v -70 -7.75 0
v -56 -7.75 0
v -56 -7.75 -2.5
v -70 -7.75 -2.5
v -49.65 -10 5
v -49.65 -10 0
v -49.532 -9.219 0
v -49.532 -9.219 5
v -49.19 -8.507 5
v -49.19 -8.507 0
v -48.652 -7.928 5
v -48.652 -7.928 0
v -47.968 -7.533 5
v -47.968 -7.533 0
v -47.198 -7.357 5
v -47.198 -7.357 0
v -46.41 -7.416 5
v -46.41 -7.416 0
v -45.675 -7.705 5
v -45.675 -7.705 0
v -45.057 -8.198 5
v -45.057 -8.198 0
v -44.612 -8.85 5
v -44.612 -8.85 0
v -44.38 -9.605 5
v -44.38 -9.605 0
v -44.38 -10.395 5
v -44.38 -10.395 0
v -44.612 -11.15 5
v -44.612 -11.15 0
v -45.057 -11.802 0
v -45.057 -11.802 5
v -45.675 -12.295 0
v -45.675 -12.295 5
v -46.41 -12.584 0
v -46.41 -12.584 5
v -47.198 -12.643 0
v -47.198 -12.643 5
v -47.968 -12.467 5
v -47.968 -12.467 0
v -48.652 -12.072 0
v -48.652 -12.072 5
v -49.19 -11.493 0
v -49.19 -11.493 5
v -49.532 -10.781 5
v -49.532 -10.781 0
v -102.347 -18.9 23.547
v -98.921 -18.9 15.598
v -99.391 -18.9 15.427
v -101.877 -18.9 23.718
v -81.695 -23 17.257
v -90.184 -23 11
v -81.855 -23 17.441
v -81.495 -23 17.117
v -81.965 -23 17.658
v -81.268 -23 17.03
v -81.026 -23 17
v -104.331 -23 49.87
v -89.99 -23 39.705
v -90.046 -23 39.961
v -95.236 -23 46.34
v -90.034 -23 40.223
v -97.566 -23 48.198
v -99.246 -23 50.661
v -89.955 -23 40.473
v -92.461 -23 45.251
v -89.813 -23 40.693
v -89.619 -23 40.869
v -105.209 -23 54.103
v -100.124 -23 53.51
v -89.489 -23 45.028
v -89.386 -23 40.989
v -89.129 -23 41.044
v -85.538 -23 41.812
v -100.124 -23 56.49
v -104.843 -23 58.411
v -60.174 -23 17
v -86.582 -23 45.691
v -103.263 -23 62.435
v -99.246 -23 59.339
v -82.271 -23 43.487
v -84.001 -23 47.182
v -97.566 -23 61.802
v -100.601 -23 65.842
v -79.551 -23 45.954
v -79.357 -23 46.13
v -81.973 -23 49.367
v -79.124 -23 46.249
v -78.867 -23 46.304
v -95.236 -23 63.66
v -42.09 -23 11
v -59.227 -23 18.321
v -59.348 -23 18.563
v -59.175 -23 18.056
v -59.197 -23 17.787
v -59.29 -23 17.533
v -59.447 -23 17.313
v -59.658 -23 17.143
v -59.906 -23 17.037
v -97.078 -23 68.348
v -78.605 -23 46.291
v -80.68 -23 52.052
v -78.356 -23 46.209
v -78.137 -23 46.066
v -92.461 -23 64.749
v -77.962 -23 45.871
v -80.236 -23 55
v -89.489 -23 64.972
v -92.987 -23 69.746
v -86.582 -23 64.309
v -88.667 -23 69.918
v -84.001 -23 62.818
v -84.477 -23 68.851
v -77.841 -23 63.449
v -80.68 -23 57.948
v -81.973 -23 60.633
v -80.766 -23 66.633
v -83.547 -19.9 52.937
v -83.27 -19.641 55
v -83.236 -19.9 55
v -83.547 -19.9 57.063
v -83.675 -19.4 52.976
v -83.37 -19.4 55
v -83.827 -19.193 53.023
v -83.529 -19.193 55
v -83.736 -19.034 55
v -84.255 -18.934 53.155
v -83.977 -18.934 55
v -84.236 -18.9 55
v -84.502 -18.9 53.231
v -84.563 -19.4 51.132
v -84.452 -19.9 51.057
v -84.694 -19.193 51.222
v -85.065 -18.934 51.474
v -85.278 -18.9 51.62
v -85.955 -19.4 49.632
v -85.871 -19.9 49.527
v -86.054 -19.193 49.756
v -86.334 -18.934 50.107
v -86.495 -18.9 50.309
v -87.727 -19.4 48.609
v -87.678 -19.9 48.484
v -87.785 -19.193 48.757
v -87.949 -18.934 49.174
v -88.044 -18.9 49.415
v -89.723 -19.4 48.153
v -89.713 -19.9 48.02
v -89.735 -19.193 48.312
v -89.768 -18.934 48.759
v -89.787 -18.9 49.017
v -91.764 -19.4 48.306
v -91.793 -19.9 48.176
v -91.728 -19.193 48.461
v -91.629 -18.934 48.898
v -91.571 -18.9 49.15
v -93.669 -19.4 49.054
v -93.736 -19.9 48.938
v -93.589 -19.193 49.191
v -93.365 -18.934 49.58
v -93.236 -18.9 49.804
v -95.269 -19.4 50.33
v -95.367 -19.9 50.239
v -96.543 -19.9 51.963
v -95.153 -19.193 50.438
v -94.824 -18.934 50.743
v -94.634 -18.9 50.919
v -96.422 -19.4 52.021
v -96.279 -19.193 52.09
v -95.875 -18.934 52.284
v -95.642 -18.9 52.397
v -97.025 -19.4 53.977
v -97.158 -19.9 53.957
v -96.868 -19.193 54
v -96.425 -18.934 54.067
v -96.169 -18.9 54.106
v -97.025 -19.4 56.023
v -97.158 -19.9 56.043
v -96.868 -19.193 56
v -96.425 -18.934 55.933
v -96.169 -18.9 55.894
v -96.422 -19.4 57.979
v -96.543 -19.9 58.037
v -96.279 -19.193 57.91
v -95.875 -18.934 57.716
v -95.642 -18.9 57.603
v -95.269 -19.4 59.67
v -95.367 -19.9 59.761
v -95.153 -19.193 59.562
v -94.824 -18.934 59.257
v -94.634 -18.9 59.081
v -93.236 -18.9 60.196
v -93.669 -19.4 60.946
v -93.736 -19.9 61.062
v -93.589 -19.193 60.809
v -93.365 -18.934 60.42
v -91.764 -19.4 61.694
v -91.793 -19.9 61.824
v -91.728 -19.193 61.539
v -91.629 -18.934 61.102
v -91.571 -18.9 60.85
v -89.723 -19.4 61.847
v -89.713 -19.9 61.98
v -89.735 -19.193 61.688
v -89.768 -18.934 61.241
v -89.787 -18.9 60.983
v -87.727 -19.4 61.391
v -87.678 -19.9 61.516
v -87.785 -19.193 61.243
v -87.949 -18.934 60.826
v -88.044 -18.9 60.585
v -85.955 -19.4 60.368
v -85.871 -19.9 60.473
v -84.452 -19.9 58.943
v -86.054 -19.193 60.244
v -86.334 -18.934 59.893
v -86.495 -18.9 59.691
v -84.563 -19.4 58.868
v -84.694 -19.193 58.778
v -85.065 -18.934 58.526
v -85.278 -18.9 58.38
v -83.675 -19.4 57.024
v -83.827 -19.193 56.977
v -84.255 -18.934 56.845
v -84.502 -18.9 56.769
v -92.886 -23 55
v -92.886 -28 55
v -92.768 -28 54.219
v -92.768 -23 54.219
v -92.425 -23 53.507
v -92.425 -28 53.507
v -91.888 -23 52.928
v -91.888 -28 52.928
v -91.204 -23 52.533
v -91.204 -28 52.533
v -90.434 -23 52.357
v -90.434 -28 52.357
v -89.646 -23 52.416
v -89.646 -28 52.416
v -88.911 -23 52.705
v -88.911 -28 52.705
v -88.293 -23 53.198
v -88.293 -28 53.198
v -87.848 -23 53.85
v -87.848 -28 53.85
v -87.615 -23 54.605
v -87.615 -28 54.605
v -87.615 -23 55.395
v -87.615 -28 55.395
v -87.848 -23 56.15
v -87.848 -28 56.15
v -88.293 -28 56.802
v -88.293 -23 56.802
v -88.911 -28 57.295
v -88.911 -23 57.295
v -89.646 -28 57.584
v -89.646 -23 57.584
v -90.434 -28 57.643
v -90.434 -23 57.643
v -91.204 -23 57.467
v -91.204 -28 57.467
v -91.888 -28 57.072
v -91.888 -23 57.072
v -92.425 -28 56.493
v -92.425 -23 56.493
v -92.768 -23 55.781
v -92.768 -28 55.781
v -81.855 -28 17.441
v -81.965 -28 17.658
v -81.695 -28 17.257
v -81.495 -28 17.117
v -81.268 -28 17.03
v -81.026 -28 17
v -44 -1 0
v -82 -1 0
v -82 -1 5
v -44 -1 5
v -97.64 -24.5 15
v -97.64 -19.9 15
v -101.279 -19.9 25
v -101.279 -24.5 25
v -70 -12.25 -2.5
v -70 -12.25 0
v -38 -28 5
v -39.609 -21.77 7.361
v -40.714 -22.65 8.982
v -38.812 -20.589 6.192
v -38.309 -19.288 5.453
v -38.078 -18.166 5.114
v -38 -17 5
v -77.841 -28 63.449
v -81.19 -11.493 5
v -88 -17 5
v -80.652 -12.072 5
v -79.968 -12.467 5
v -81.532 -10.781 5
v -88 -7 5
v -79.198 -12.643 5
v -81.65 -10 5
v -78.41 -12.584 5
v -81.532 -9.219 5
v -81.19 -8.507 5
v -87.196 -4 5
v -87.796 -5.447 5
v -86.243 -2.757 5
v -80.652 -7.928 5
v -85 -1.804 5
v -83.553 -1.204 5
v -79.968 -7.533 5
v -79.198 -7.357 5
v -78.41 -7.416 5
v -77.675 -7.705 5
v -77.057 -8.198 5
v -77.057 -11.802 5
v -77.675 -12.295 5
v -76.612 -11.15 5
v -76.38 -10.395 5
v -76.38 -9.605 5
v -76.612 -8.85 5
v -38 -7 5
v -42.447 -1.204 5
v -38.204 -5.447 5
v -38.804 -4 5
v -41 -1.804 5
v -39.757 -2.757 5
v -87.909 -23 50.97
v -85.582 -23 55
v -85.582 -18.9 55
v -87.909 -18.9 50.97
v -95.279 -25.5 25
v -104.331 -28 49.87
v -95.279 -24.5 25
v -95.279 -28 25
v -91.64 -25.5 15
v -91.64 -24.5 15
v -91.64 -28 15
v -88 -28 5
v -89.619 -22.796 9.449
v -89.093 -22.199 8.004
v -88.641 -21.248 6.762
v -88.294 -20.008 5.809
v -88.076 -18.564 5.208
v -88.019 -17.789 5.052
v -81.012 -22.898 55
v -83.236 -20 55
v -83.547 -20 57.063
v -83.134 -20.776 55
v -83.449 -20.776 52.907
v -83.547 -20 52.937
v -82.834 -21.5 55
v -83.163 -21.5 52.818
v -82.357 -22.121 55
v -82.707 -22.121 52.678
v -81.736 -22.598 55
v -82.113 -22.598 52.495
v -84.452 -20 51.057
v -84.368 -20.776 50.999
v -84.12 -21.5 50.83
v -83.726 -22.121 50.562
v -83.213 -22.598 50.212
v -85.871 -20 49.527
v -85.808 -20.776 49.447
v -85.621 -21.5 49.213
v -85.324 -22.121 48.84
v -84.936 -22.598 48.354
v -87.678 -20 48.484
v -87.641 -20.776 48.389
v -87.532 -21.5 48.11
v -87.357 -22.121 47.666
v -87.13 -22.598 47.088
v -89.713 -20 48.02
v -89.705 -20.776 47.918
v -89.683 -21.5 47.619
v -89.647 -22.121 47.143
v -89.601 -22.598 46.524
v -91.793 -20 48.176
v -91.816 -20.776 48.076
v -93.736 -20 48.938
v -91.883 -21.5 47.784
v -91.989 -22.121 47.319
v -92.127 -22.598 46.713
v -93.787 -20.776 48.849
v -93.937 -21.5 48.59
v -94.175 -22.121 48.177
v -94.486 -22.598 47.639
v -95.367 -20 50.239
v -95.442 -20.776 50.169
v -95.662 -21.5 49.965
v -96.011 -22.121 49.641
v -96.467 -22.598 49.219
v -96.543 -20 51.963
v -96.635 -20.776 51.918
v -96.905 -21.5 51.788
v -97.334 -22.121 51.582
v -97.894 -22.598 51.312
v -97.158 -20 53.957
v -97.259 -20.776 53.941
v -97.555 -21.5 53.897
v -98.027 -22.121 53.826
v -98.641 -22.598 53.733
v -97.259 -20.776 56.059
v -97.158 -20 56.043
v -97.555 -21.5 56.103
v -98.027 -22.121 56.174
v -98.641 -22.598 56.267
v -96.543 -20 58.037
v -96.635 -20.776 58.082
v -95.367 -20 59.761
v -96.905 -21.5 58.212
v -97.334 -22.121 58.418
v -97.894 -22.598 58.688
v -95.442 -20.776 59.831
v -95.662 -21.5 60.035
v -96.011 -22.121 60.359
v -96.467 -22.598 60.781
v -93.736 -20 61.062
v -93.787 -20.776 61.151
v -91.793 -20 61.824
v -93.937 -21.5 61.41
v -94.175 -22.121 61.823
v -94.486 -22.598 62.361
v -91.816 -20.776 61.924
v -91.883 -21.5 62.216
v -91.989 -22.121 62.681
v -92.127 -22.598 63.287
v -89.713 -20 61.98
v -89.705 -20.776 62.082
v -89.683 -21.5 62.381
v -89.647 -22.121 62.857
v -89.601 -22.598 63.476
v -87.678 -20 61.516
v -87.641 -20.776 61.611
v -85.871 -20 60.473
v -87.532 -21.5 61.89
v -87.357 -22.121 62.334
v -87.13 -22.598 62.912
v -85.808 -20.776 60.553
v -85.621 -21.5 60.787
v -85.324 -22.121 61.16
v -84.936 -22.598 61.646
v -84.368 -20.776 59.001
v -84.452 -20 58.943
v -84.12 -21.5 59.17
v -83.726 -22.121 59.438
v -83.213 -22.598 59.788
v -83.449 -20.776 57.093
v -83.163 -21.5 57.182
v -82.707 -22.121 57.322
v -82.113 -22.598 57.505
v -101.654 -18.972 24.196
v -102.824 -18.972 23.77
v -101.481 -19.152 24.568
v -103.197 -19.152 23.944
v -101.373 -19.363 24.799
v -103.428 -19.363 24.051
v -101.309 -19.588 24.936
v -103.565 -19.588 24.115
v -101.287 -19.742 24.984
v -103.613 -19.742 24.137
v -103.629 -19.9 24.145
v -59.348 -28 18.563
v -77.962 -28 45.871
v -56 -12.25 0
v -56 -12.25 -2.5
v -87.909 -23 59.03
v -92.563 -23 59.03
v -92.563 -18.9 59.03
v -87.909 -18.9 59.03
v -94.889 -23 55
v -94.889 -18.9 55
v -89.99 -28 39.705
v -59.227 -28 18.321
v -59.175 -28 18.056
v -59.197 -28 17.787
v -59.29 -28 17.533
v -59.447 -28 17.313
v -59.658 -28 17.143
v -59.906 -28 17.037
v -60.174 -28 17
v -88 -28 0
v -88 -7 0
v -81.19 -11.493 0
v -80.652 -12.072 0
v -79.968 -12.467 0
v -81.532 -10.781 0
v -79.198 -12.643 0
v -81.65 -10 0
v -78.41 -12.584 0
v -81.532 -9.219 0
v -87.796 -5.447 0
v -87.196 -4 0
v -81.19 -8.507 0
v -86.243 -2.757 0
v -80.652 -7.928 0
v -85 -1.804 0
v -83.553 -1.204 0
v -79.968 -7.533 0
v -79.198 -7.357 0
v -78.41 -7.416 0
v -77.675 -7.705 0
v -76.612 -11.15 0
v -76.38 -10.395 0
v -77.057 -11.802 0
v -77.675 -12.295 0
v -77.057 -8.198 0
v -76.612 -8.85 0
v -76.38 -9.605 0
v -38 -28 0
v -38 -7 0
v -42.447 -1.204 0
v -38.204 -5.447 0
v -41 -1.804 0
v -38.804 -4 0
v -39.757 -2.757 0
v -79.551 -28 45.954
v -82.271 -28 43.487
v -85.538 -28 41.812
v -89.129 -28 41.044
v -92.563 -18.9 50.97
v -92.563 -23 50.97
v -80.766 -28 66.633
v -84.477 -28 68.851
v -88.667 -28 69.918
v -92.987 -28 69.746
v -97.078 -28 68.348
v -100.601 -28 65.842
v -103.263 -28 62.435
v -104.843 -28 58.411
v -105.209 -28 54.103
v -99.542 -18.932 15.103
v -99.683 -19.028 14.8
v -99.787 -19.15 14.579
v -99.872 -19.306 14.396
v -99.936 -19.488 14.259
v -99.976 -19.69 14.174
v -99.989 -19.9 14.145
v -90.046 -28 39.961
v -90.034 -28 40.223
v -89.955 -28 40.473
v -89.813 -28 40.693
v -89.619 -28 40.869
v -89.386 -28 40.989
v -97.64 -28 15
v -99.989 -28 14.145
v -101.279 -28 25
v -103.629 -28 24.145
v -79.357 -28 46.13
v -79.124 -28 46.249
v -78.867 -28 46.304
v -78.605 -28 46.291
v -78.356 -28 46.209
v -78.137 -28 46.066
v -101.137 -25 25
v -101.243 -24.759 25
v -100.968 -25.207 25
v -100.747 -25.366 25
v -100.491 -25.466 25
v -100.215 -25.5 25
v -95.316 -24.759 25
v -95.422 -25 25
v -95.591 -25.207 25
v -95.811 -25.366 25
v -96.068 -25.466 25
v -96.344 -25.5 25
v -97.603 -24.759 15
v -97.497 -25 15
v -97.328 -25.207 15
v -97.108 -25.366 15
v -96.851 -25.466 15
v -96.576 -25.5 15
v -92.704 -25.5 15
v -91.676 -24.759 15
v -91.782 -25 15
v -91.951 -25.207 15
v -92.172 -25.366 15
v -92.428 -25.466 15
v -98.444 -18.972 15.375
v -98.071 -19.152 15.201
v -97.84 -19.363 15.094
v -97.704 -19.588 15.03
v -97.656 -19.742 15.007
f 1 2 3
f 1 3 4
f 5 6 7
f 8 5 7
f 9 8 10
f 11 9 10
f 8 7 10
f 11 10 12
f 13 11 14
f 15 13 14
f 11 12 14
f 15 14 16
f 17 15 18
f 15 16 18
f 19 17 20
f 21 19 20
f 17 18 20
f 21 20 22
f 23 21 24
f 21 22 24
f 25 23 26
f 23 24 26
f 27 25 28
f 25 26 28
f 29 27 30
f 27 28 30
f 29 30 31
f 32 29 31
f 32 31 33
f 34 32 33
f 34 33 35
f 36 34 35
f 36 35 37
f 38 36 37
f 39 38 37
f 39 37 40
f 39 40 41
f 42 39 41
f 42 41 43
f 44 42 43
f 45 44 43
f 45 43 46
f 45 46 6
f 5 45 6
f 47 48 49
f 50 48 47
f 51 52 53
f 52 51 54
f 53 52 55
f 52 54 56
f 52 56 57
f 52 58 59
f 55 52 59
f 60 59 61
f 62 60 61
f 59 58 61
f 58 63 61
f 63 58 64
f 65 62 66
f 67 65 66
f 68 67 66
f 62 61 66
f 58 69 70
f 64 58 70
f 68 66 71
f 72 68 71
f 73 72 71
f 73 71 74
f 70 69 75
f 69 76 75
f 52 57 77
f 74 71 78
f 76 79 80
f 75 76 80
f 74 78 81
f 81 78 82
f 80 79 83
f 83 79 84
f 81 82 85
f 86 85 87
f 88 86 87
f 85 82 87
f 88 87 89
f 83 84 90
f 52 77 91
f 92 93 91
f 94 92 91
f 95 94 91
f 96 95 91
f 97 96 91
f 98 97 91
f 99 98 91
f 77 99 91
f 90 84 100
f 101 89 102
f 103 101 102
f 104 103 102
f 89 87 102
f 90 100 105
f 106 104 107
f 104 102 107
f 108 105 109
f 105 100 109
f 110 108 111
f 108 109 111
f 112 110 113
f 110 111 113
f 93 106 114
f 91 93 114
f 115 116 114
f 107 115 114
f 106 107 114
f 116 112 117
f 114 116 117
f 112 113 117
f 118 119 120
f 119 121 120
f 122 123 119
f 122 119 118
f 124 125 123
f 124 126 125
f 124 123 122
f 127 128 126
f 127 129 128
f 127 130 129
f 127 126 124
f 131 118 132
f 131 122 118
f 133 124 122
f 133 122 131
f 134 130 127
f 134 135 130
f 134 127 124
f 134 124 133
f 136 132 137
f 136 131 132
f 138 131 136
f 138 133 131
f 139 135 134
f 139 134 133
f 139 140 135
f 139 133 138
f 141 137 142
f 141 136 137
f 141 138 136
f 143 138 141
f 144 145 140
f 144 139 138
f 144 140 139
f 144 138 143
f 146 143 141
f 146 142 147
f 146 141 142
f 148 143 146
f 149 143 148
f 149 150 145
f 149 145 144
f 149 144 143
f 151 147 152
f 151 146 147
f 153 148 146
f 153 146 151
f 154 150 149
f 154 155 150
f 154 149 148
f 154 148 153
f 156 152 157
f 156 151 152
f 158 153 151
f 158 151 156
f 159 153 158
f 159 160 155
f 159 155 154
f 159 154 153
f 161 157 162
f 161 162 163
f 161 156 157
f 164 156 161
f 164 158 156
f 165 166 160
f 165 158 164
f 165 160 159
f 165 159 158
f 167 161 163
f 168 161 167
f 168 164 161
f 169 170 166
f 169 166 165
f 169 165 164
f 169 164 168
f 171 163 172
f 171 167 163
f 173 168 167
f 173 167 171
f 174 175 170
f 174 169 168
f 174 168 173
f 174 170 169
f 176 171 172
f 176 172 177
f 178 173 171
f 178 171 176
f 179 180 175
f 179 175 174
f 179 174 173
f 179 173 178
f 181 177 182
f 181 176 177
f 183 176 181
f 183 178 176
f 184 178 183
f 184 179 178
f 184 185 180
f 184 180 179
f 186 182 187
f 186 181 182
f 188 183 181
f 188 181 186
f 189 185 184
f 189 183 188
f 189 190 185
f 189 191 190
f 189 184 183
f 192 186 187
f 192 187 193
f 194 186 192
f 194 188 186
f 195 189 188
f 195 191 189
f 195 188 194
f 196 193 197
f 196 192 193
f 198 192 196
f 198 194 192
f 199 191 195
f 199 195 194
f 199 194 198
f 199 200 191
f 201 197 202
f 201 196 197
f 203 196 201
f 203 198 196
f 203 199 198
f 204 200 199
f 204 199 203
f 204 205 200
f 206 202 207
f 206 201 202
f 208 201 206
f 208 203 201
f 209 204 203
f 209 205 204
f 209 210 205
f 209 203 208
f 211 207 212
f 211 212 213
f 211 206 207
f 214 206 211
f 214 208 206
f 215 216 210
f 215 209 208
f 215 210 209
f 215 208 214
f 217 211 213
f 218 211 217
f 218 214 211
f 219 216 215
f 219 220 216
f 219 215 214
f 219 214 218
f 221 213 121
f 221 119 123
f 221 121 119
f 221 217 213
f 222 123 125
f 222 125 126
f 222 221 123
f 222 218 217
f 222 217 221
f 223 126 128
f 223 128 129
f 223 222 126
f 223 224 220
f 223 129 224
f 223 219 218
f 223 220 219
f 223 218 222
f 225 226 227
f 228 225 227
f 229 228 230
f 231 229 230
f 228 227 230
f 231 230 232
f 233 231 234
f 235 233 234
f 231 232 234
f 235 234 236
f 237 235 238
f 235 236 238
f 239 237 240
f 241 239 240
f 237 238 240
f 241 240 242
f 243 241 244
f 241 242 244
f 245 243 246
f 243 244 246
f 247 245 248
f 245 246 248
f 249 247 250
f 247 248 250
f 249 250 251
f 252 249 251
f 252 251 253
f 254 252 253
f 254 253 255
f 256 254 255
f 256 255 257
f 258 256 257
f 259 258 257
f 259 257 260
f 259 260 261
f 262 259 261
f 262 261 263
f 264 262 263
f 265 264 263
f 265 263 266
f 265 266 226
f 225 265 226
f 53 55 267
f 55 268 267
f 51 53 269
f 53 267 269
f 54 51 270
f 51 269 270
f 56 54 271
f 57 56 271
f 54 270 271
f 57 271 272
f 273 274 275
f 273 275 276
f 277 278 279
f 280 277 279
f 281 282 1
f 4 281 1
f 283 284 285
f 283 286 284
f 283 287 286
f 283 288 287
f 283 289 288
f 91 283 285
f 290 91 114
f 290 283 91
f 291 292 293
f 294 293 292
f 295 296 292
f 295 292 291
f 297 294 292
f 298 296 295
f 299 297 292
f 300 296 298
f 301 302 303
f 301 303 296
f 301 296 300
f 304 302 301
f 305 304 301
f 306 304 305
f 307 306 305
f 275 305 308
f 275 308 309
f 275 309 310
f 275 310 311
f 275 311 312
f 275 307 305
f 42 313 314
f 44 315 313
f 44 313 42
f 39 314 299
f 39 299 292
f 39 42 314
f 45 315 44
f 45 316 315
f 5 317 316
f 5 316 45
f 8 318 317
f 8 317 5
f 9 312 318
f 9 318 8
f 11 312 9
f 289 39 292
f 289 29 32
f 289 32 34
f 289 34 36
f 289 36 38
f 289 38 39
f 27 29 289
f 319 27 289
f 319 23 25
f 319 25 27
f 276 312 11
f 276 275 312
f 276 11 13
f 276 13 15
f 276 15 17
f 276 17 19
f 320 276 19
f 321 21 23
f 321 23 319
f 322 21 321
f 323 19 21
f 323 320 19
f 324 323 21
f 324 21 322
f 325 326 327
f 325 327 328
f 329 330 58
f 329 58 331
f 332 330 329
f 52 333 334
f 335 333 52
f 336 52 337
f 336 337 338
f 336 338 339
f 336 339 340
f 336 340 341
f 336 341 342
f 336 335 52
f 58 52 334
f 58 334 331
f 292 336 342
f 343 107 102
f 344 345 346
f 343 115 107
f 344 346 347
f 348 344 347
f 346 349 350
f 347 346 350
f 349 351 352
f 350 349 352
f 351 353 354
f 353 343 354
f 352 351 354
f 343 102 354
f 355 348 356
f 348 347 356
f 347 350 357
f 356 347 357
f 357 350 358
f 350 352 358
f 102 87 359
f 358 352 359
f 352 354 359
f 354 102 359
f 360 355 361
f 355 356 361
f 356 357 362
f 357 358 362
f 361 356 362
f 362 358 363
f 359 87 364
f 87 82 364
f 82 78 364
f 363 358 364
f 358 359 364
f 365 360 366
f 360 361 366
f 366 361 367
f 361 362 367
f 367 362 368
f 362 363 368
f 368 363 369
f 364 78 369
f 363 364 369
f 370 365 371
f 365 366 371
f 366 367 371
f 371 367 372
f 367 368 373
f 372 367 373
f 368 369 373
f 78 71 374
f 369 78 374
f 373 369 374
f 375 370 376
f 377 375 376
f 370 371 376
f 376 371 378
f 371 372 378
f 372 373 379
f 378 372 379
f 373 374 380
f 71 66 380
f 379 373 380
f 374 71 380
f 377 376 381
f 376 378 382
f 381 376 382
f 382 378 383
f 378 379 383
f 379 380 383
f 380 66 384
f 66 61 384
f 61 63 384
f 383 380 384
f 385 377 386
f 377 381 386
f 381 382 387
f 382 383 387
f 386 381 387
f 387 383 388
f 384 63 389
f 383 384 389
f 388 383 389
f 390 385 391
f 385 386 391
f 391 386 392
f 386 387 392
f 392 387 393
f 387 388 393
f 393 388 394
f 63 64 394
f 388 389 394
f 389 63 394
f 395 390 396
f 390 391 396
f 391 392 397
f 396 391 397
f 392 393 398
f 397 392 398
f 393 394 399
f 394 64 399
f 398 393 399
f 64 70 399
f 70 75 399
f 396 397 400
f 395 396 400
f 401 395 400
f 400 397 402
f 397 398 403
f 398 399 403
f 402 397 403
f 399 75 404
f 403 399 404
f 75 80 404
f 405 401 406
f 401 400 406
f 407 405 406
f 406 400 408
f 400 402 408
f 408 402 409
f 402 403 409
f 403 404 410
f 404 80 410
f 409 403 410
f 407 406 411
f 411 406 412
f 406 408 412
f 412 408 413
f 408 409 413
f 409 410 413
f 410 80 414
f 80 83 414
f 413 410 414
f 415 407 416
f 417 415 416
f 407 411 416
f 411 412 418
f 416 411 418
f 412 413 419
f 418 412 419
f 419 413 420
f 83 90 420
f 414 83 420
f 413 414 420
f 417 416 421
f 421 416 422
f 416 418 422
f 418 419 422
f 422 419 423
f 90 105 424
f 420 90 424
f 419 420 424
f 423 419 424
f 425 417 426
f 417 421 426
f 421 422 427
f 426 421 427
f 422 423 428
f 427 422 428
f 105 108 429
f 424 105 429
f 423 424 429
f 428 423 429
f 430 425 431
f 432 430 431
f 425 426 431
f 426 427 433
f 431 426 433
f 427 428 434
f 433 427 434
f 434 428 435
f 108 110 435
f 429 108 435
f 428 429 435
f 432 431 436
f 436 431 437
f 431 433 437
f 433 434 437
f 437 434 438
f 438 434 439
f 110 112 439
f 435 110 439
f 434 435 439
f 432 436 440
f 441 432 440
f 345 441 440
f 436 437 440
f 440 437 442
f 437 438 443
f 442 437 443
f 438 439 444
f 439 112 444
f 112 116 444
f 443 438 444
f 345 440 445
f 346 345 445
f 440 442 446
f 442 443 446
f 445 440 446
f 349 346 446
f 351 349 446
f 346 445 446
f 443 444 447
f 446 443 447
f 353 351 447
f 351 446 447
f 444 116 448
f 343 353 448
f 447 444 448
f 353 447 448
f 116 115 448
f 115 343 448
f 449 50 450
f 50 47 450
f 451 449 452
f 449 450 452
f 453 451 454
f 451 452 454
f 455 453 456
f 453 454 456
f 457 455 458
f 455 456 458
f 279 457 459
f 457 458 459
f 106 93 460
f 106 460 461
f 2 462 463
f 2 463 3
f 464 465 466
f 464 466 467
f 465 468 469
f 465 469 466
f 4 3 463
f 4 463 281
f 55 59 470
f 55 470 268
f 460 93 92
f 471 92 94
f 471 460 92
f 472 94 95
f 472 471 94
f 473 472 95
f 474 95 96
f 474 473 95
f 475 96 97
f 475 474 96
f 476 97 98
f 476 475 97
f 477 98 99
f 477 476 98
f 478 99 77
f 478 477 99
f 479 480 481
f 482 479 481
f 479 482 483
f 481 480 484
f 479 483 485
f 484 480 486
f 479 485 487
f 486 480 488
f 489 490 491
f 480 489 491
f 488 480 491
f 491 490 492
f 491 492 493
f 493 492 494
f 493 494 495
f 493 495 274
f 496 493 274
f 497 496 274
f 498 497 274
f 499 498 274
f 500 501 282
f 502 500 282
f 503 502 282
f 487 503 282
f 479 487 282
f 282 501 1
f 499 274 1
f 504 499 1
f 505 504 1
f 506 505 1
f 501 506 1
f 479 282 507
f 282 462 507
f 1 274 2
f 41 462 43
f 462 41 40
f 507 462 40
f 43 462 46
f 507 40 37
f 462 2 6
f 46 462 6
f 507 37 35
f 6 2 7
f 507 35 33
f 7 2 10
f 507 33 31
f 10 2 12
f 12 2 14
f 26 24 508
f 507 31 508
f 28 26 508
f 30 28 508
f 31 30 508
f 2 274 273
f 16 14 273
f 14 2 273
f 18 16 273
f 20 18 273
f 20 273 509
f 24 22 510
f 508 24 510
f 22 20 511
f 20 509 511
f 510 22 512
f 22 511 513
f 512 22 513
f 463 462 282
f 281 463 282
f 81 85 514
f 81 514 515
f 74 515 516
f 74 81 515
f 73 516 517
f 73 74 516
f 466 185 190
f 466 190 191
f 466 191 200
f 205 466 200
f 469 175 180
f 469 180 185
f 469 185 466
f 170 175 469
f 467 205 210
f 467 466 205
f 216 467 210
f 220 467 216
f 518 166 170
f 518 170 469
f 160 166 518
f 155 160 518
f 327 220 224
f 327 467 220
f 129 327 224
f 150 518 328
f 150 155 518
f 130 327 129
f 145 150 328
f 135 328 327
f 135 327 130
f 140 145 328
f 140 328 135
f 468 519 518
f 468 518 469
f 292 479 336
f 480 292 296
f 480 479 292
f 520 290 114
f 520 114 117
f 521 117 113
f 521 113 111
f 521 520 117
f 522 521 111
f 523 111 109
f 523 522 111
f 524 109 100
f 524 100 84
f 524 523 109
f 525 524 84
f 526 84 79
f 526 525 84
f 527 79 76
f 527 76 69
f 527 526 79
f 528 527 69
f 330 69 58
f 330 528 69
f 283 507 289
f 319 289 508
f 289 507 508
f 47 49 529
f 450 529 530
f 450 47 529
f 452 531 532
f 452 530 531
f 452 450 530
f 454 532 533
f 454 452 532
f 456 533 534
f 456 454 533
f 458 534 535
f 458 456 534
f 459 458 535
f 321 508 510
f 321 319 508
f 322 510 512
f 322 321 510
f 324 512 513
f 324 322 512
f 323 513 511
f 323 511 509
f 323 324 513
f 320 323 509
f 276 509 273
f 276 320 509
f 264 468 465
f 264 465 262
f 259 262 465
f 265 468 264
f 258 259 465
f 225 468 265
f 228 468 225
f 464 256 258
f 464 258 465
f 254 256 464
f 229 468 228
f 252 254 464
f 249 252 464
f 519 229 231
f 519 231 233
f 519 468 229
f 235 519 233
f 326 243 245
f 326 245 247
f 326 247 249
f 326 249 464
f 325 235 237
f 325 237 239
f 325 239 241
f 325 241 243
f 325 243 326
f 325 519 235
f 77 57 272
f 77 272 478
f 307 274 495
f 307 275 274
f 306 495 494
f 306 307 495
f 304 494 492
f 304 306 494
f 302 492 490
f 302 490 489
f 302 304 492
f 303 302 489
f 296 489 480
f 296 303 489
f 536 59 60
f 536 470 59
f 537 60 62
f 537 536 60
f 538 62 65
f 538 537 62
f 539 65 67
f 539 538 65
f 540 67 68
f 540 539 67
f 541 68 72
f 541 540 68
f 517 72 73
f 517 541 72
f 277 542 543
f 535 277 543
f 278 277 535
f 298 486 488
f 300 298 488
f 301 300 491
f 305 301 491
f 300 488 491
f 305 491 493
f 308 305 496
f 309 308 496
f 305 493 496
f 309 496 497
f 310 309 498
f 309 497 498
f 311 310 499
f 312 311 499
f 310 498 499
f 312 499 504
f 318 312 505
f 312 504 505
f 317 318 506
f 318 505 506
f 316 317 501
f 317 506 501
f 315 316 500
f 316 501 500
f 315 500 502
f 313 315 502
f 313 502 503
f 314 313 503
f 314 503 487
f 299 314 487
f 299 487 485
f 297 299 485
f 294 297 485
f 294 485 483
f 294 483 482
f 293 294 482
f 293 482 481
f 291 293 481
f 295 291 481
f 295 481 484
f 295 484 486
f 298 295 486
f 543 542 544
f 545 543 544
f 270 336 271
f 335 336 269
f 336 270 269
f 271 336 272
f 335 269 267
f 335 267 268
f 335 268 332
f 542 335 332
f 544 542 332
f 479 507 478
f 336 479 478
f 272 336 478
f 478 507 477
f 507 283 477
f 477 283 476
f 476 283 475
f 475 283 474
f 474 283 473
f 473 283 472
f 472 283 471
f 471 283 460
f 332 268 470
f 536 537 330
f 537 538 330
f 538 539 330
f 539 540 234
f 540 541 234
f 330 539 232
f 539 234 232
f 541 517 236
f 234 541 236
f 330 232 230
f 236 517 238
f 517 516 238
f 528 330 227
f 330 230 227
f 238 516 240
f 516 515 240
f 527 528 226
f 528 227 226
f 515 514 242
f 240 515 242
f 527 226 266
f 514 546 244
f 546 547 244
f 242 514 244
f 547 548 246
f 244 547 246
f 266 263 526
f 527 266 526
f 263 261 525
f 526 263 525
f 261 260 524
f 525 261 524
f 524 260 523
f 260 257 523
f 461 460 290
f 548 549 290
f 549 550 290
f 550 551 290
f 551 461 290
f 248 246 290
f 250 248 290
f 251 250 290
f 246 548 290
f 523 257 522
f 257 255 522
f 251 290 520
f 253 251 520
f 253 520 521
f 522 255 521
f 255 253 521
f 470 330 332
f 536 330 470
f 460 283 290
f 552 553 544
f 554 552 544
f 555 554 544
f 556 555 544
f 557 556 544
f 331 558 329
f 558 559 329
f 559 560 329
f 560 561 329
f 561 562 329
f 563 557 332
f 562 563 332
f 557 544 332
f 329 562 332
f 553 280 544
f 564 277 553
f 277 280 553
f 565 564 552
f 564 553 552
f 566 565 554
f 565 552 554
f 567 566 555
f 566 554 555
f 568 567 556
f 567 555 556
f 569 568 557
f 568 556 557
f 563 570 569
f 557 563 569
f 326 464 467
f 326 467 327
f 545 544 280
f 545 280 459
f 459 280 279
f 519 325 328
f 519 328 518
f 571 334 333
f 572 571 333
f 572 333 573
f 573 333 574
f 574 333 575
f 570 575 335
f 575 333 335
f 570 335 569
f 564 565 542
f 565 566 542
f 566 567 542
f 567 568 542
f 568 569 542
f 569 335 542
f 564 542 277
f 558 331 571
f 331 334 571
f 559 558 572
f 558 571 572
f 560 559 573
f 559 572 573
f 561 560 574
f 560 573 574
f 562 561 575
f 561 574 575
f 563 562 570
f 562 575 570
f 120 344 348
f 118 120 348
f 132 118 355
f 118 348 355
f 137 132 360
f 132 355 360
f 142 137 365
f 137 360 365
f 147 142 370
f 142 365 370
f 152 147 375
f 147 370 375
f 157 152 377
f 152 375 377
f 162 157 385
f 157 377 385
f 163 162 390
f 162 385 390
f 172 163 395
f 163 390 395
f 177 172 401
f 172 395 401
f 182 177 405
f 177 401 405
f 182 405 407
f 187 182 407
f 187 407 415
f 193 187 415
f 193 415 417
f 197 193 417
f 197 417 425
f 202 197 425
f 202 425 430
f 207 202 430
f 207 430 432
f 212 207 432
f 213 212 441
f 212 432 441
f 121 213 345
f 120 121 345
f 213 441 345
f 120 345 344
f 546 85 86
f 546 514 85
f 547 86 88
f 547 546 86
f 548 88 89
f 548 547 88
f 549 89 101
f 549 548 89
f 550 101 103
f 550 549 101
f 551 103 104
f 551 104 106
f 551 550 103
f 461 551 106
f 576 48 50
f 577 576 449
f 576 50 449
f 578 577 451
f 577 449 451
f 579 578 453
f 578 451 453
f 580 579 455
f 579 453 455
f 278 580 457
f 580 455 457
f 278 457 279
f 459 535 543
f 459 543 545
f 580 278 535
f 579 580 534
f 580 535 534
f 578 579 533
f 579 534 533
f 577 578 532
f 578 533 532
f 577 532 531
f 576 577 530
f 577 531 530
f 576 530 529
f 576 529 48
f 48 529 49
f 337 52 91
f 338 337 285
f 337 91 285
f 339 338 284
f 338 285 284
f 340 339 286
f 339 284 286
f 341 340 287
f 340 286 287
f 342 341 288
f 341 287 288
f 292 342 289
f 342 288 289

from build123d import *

# Parameters (mm, degrees)
SKETCH3_W            = 50
SKETCH3_H            = 27
BOSS_EXTRUDE1_DEPTH  = 5
BOSS_EXTRUDE2_DEPTH  = 5
M5_CLEARANCE_HOLE1_D = 5.3
FILLET1_R            = 6
M5_CLEARANCE_HOLE2_D = 5.3
SKETCH11_R           = 7
BOSS_EXTRUDE3_DEPTH  = 4.1
CUT_EXTRUDE1_DEPTH   = 23
FILLET2_R            = 3
FILLET3_R            = 1
SKETCH12_W           = 14
SKETCH12_H           = 4.5
BOSS_EXTRUDE4_DEPTH  = 2.5
BOSS_EXTRUDE5_DEPTH  = 2.5
SKETCH14_W           = 10.641777725
SKETCH14_H           = 9.1
BOSS_EXTRUDE6_DEPTH  = 2.5
FILLET4_R            = 1
CUT_EXTRUDE2_DEPTH   = 6
FILLET5_R            = 1


with BuildPart() as part:
    # Sketch3 → Boss-Extrude1 (new body)
    with BuildSketch(Plane.XY):
        with Locations((-63, -14.5)):
            Rectangle(SKETCH3_W, SKETCH3_H)
    extrude(amount=BOSS_EXTRUDE1_DEPTH)

    # Sketch5 → Boss-Extrude2 (add)
    with BuildSketch(Plane.XZ.offset(28)):
        with BuildLine():
            Line((-38, 5), (-77.841460566, 63.448623046))
            ThreePointArc((-77.841460566, 63.448623046), (-97.078370732, 68.348402277), (-104.331234438, 49.86969785))
            Line((-104.331234438, 49.86969785), (-88, 5))
            Line((-88, 5), (-88, 0))
            Line((-88, 0), (-38, 0))
            Line((-38, 0), (-38, 5))
        make_face()
    extrude(amount=-BOSS_EXTRUDE2_DEPTH)

    # M5 Clearance Hole1 (through all)
    with Locations(Plane.XY.offset(5)):
        with Locations((-79, -10), (-47, -10)):
            Hole(M5_CLEARANCE_HOLE1_D / 2)

    # Fillet1
    fillet1_edges = [part.edges().sort_by_distance(p)[0] for p in [
        (-63, -23, 5),
        (-88, -1, 2.5),
        (-38, -1, 2.5),
    ]]
    fillet(fillet1_edges, radius=FILLET1_R)

    # M5 Clearance Hole2 (through all)
    with Locations(Plane(origin=(0, -23, 0), x_dir=(1, 0, 0), z_dir=(0, 1, 0))):
        with Locations((-90.235845126, -55)):
            Hole(M5_CLEARANCE_HOLE2_D / 2)

    # Sketch11 → Boss-Extrude3 (add)
    with BuildSketch(Plane(origin=(0, -23, 0), x_dir=(1, 0, 0), z_dir=(0, 1, 0))):
        with Locations((-90.235845126, -55)):
            Circle(SKETCH11_R)
    extrude(amount=BOSS_EXTRUDE3_DEPTH)

    # Sketch10 → Cut-Extrude1 (cut, through all)
    with BuildSketch(Plane(origin=(0, -23, 0), x_dir=(1, 0, 0), z_dir=(0, 1, 0))):
        Polygon((-92.562566711, -50.97), (-94.889288296, -55), (-92.562566711, -59.03), (-87.909123541, -59.03), (-85.582401957, -55), (-87.909123541, -50.97), align=None)
    extrude(amount=CUT_EXTRUDE1_DEPTH, mode=Mode.SUBTRACT)

    # Fillet2
    fillet2_edges = [part.edges().sort_by_distance(p)[0] for p in [
        (-97.235845126, -23, 55),
    ]]
    fillet(fillet2_edges, radius=FILLET2_R)

    # Fillet3
    fillet3_edges = [part.edges().sort_by_distance(p)[0] for p in [
        (-97.235845126, -18.9, 55),
    ]]
    fillet(fillet3_edges, radius=FILLET3_R)

    # Sketch12 → Boss-Extrude4 (add)
    with BuildSketch(Plane(origin=(0, 0, 0), x_dir=(-1, 0, 0), z_dir=(0, 0, -1))):
        with Locations((63, -10)):
            Rectangle(SKETCH12_W, SKETCH12_H)
    extrude(amount=BOSS_EXTRUDE4_DEPTH)

    # Sketch13 → Boss-Extrude5 (add)
    with BuildSketch(Plane.XZ.offset(28)):
        Polygon((-91.639702343, 15), (-97.639702343, 15), (-101.279404685, 25), (-95.279404685, 25), align=None)
    extrude(amount=-BOSS_EXTRUDE5_DEPTH)

    # Sketch14 → Boss-Extrude6 (add)
    with BuildSketch(Plane(origin=(-81.397119802, 0, -29.626128763), x_dir=(-0.342020143, 0, 0.939692621), z_dir=(-0.939692621, 0, -0.342020143))):
        with Locations((52.811023164, -23.45)):
            Rectangle(SKETCH14_W, SKETCH14_H)
    extrude(amount=BOSS_EXTRUDE6_DEPTH)

    # Fillet4
    fillet4_edges = [part.edges().sort_by_distance(p)[0] for p in [
        (-93.459553514, -25.5, 20),
        (-99.459553514, -25.5, 20),
        (-99.459553514, -18.9, 20),
        (-102.454020461, -18.9, 24.572474821),
        (-98.814318119, -18.9, 14.572474821),
        (-101.808785066, -18.9, 19.144949642),
    ]]
    fillet(fillet4_edges, radius=FILLET4_R)

    # Sketch15 → Cut-Extrude2 (cut, through all)
    with BuildSketch(Plane(origin=(0, -23, 0), x_dir=(1, 0, 0), z_dir=(0, 1, 0))):
        with BuildLine():
            Line((-81.725865086, -17), (-58.2820459, -17))
            Line((-58.2820459, -17), (-78.739044792, -47.011033729))
            ThreePointArc((-78.739044792, -47.011033729), (-83.849487894, -42.541491209), (-90.461814506, -41.001823767))
            Line((-90.461814506, -41.001823767), (-81.725865086, -17))
        make_face()
    extrude(amount=-CUT_EXTRUDE2_DEPTH, mode=Mode.SUBTRACT)

    # Fillet5
    fillet5_edges = [part.edges().sort_by_distance(p)[0] for p in [
        (-90.461814506, -25.5, 41.001823767),
        (-81.725865086, -25.5, 17),
        (-58.2820459, -25.5, 17),
        (-78.739044792, -25.5, 47.011033729),
    ]]
    fillet(fillet5_edges, radius=FILLET5_R)


solid = part.part
